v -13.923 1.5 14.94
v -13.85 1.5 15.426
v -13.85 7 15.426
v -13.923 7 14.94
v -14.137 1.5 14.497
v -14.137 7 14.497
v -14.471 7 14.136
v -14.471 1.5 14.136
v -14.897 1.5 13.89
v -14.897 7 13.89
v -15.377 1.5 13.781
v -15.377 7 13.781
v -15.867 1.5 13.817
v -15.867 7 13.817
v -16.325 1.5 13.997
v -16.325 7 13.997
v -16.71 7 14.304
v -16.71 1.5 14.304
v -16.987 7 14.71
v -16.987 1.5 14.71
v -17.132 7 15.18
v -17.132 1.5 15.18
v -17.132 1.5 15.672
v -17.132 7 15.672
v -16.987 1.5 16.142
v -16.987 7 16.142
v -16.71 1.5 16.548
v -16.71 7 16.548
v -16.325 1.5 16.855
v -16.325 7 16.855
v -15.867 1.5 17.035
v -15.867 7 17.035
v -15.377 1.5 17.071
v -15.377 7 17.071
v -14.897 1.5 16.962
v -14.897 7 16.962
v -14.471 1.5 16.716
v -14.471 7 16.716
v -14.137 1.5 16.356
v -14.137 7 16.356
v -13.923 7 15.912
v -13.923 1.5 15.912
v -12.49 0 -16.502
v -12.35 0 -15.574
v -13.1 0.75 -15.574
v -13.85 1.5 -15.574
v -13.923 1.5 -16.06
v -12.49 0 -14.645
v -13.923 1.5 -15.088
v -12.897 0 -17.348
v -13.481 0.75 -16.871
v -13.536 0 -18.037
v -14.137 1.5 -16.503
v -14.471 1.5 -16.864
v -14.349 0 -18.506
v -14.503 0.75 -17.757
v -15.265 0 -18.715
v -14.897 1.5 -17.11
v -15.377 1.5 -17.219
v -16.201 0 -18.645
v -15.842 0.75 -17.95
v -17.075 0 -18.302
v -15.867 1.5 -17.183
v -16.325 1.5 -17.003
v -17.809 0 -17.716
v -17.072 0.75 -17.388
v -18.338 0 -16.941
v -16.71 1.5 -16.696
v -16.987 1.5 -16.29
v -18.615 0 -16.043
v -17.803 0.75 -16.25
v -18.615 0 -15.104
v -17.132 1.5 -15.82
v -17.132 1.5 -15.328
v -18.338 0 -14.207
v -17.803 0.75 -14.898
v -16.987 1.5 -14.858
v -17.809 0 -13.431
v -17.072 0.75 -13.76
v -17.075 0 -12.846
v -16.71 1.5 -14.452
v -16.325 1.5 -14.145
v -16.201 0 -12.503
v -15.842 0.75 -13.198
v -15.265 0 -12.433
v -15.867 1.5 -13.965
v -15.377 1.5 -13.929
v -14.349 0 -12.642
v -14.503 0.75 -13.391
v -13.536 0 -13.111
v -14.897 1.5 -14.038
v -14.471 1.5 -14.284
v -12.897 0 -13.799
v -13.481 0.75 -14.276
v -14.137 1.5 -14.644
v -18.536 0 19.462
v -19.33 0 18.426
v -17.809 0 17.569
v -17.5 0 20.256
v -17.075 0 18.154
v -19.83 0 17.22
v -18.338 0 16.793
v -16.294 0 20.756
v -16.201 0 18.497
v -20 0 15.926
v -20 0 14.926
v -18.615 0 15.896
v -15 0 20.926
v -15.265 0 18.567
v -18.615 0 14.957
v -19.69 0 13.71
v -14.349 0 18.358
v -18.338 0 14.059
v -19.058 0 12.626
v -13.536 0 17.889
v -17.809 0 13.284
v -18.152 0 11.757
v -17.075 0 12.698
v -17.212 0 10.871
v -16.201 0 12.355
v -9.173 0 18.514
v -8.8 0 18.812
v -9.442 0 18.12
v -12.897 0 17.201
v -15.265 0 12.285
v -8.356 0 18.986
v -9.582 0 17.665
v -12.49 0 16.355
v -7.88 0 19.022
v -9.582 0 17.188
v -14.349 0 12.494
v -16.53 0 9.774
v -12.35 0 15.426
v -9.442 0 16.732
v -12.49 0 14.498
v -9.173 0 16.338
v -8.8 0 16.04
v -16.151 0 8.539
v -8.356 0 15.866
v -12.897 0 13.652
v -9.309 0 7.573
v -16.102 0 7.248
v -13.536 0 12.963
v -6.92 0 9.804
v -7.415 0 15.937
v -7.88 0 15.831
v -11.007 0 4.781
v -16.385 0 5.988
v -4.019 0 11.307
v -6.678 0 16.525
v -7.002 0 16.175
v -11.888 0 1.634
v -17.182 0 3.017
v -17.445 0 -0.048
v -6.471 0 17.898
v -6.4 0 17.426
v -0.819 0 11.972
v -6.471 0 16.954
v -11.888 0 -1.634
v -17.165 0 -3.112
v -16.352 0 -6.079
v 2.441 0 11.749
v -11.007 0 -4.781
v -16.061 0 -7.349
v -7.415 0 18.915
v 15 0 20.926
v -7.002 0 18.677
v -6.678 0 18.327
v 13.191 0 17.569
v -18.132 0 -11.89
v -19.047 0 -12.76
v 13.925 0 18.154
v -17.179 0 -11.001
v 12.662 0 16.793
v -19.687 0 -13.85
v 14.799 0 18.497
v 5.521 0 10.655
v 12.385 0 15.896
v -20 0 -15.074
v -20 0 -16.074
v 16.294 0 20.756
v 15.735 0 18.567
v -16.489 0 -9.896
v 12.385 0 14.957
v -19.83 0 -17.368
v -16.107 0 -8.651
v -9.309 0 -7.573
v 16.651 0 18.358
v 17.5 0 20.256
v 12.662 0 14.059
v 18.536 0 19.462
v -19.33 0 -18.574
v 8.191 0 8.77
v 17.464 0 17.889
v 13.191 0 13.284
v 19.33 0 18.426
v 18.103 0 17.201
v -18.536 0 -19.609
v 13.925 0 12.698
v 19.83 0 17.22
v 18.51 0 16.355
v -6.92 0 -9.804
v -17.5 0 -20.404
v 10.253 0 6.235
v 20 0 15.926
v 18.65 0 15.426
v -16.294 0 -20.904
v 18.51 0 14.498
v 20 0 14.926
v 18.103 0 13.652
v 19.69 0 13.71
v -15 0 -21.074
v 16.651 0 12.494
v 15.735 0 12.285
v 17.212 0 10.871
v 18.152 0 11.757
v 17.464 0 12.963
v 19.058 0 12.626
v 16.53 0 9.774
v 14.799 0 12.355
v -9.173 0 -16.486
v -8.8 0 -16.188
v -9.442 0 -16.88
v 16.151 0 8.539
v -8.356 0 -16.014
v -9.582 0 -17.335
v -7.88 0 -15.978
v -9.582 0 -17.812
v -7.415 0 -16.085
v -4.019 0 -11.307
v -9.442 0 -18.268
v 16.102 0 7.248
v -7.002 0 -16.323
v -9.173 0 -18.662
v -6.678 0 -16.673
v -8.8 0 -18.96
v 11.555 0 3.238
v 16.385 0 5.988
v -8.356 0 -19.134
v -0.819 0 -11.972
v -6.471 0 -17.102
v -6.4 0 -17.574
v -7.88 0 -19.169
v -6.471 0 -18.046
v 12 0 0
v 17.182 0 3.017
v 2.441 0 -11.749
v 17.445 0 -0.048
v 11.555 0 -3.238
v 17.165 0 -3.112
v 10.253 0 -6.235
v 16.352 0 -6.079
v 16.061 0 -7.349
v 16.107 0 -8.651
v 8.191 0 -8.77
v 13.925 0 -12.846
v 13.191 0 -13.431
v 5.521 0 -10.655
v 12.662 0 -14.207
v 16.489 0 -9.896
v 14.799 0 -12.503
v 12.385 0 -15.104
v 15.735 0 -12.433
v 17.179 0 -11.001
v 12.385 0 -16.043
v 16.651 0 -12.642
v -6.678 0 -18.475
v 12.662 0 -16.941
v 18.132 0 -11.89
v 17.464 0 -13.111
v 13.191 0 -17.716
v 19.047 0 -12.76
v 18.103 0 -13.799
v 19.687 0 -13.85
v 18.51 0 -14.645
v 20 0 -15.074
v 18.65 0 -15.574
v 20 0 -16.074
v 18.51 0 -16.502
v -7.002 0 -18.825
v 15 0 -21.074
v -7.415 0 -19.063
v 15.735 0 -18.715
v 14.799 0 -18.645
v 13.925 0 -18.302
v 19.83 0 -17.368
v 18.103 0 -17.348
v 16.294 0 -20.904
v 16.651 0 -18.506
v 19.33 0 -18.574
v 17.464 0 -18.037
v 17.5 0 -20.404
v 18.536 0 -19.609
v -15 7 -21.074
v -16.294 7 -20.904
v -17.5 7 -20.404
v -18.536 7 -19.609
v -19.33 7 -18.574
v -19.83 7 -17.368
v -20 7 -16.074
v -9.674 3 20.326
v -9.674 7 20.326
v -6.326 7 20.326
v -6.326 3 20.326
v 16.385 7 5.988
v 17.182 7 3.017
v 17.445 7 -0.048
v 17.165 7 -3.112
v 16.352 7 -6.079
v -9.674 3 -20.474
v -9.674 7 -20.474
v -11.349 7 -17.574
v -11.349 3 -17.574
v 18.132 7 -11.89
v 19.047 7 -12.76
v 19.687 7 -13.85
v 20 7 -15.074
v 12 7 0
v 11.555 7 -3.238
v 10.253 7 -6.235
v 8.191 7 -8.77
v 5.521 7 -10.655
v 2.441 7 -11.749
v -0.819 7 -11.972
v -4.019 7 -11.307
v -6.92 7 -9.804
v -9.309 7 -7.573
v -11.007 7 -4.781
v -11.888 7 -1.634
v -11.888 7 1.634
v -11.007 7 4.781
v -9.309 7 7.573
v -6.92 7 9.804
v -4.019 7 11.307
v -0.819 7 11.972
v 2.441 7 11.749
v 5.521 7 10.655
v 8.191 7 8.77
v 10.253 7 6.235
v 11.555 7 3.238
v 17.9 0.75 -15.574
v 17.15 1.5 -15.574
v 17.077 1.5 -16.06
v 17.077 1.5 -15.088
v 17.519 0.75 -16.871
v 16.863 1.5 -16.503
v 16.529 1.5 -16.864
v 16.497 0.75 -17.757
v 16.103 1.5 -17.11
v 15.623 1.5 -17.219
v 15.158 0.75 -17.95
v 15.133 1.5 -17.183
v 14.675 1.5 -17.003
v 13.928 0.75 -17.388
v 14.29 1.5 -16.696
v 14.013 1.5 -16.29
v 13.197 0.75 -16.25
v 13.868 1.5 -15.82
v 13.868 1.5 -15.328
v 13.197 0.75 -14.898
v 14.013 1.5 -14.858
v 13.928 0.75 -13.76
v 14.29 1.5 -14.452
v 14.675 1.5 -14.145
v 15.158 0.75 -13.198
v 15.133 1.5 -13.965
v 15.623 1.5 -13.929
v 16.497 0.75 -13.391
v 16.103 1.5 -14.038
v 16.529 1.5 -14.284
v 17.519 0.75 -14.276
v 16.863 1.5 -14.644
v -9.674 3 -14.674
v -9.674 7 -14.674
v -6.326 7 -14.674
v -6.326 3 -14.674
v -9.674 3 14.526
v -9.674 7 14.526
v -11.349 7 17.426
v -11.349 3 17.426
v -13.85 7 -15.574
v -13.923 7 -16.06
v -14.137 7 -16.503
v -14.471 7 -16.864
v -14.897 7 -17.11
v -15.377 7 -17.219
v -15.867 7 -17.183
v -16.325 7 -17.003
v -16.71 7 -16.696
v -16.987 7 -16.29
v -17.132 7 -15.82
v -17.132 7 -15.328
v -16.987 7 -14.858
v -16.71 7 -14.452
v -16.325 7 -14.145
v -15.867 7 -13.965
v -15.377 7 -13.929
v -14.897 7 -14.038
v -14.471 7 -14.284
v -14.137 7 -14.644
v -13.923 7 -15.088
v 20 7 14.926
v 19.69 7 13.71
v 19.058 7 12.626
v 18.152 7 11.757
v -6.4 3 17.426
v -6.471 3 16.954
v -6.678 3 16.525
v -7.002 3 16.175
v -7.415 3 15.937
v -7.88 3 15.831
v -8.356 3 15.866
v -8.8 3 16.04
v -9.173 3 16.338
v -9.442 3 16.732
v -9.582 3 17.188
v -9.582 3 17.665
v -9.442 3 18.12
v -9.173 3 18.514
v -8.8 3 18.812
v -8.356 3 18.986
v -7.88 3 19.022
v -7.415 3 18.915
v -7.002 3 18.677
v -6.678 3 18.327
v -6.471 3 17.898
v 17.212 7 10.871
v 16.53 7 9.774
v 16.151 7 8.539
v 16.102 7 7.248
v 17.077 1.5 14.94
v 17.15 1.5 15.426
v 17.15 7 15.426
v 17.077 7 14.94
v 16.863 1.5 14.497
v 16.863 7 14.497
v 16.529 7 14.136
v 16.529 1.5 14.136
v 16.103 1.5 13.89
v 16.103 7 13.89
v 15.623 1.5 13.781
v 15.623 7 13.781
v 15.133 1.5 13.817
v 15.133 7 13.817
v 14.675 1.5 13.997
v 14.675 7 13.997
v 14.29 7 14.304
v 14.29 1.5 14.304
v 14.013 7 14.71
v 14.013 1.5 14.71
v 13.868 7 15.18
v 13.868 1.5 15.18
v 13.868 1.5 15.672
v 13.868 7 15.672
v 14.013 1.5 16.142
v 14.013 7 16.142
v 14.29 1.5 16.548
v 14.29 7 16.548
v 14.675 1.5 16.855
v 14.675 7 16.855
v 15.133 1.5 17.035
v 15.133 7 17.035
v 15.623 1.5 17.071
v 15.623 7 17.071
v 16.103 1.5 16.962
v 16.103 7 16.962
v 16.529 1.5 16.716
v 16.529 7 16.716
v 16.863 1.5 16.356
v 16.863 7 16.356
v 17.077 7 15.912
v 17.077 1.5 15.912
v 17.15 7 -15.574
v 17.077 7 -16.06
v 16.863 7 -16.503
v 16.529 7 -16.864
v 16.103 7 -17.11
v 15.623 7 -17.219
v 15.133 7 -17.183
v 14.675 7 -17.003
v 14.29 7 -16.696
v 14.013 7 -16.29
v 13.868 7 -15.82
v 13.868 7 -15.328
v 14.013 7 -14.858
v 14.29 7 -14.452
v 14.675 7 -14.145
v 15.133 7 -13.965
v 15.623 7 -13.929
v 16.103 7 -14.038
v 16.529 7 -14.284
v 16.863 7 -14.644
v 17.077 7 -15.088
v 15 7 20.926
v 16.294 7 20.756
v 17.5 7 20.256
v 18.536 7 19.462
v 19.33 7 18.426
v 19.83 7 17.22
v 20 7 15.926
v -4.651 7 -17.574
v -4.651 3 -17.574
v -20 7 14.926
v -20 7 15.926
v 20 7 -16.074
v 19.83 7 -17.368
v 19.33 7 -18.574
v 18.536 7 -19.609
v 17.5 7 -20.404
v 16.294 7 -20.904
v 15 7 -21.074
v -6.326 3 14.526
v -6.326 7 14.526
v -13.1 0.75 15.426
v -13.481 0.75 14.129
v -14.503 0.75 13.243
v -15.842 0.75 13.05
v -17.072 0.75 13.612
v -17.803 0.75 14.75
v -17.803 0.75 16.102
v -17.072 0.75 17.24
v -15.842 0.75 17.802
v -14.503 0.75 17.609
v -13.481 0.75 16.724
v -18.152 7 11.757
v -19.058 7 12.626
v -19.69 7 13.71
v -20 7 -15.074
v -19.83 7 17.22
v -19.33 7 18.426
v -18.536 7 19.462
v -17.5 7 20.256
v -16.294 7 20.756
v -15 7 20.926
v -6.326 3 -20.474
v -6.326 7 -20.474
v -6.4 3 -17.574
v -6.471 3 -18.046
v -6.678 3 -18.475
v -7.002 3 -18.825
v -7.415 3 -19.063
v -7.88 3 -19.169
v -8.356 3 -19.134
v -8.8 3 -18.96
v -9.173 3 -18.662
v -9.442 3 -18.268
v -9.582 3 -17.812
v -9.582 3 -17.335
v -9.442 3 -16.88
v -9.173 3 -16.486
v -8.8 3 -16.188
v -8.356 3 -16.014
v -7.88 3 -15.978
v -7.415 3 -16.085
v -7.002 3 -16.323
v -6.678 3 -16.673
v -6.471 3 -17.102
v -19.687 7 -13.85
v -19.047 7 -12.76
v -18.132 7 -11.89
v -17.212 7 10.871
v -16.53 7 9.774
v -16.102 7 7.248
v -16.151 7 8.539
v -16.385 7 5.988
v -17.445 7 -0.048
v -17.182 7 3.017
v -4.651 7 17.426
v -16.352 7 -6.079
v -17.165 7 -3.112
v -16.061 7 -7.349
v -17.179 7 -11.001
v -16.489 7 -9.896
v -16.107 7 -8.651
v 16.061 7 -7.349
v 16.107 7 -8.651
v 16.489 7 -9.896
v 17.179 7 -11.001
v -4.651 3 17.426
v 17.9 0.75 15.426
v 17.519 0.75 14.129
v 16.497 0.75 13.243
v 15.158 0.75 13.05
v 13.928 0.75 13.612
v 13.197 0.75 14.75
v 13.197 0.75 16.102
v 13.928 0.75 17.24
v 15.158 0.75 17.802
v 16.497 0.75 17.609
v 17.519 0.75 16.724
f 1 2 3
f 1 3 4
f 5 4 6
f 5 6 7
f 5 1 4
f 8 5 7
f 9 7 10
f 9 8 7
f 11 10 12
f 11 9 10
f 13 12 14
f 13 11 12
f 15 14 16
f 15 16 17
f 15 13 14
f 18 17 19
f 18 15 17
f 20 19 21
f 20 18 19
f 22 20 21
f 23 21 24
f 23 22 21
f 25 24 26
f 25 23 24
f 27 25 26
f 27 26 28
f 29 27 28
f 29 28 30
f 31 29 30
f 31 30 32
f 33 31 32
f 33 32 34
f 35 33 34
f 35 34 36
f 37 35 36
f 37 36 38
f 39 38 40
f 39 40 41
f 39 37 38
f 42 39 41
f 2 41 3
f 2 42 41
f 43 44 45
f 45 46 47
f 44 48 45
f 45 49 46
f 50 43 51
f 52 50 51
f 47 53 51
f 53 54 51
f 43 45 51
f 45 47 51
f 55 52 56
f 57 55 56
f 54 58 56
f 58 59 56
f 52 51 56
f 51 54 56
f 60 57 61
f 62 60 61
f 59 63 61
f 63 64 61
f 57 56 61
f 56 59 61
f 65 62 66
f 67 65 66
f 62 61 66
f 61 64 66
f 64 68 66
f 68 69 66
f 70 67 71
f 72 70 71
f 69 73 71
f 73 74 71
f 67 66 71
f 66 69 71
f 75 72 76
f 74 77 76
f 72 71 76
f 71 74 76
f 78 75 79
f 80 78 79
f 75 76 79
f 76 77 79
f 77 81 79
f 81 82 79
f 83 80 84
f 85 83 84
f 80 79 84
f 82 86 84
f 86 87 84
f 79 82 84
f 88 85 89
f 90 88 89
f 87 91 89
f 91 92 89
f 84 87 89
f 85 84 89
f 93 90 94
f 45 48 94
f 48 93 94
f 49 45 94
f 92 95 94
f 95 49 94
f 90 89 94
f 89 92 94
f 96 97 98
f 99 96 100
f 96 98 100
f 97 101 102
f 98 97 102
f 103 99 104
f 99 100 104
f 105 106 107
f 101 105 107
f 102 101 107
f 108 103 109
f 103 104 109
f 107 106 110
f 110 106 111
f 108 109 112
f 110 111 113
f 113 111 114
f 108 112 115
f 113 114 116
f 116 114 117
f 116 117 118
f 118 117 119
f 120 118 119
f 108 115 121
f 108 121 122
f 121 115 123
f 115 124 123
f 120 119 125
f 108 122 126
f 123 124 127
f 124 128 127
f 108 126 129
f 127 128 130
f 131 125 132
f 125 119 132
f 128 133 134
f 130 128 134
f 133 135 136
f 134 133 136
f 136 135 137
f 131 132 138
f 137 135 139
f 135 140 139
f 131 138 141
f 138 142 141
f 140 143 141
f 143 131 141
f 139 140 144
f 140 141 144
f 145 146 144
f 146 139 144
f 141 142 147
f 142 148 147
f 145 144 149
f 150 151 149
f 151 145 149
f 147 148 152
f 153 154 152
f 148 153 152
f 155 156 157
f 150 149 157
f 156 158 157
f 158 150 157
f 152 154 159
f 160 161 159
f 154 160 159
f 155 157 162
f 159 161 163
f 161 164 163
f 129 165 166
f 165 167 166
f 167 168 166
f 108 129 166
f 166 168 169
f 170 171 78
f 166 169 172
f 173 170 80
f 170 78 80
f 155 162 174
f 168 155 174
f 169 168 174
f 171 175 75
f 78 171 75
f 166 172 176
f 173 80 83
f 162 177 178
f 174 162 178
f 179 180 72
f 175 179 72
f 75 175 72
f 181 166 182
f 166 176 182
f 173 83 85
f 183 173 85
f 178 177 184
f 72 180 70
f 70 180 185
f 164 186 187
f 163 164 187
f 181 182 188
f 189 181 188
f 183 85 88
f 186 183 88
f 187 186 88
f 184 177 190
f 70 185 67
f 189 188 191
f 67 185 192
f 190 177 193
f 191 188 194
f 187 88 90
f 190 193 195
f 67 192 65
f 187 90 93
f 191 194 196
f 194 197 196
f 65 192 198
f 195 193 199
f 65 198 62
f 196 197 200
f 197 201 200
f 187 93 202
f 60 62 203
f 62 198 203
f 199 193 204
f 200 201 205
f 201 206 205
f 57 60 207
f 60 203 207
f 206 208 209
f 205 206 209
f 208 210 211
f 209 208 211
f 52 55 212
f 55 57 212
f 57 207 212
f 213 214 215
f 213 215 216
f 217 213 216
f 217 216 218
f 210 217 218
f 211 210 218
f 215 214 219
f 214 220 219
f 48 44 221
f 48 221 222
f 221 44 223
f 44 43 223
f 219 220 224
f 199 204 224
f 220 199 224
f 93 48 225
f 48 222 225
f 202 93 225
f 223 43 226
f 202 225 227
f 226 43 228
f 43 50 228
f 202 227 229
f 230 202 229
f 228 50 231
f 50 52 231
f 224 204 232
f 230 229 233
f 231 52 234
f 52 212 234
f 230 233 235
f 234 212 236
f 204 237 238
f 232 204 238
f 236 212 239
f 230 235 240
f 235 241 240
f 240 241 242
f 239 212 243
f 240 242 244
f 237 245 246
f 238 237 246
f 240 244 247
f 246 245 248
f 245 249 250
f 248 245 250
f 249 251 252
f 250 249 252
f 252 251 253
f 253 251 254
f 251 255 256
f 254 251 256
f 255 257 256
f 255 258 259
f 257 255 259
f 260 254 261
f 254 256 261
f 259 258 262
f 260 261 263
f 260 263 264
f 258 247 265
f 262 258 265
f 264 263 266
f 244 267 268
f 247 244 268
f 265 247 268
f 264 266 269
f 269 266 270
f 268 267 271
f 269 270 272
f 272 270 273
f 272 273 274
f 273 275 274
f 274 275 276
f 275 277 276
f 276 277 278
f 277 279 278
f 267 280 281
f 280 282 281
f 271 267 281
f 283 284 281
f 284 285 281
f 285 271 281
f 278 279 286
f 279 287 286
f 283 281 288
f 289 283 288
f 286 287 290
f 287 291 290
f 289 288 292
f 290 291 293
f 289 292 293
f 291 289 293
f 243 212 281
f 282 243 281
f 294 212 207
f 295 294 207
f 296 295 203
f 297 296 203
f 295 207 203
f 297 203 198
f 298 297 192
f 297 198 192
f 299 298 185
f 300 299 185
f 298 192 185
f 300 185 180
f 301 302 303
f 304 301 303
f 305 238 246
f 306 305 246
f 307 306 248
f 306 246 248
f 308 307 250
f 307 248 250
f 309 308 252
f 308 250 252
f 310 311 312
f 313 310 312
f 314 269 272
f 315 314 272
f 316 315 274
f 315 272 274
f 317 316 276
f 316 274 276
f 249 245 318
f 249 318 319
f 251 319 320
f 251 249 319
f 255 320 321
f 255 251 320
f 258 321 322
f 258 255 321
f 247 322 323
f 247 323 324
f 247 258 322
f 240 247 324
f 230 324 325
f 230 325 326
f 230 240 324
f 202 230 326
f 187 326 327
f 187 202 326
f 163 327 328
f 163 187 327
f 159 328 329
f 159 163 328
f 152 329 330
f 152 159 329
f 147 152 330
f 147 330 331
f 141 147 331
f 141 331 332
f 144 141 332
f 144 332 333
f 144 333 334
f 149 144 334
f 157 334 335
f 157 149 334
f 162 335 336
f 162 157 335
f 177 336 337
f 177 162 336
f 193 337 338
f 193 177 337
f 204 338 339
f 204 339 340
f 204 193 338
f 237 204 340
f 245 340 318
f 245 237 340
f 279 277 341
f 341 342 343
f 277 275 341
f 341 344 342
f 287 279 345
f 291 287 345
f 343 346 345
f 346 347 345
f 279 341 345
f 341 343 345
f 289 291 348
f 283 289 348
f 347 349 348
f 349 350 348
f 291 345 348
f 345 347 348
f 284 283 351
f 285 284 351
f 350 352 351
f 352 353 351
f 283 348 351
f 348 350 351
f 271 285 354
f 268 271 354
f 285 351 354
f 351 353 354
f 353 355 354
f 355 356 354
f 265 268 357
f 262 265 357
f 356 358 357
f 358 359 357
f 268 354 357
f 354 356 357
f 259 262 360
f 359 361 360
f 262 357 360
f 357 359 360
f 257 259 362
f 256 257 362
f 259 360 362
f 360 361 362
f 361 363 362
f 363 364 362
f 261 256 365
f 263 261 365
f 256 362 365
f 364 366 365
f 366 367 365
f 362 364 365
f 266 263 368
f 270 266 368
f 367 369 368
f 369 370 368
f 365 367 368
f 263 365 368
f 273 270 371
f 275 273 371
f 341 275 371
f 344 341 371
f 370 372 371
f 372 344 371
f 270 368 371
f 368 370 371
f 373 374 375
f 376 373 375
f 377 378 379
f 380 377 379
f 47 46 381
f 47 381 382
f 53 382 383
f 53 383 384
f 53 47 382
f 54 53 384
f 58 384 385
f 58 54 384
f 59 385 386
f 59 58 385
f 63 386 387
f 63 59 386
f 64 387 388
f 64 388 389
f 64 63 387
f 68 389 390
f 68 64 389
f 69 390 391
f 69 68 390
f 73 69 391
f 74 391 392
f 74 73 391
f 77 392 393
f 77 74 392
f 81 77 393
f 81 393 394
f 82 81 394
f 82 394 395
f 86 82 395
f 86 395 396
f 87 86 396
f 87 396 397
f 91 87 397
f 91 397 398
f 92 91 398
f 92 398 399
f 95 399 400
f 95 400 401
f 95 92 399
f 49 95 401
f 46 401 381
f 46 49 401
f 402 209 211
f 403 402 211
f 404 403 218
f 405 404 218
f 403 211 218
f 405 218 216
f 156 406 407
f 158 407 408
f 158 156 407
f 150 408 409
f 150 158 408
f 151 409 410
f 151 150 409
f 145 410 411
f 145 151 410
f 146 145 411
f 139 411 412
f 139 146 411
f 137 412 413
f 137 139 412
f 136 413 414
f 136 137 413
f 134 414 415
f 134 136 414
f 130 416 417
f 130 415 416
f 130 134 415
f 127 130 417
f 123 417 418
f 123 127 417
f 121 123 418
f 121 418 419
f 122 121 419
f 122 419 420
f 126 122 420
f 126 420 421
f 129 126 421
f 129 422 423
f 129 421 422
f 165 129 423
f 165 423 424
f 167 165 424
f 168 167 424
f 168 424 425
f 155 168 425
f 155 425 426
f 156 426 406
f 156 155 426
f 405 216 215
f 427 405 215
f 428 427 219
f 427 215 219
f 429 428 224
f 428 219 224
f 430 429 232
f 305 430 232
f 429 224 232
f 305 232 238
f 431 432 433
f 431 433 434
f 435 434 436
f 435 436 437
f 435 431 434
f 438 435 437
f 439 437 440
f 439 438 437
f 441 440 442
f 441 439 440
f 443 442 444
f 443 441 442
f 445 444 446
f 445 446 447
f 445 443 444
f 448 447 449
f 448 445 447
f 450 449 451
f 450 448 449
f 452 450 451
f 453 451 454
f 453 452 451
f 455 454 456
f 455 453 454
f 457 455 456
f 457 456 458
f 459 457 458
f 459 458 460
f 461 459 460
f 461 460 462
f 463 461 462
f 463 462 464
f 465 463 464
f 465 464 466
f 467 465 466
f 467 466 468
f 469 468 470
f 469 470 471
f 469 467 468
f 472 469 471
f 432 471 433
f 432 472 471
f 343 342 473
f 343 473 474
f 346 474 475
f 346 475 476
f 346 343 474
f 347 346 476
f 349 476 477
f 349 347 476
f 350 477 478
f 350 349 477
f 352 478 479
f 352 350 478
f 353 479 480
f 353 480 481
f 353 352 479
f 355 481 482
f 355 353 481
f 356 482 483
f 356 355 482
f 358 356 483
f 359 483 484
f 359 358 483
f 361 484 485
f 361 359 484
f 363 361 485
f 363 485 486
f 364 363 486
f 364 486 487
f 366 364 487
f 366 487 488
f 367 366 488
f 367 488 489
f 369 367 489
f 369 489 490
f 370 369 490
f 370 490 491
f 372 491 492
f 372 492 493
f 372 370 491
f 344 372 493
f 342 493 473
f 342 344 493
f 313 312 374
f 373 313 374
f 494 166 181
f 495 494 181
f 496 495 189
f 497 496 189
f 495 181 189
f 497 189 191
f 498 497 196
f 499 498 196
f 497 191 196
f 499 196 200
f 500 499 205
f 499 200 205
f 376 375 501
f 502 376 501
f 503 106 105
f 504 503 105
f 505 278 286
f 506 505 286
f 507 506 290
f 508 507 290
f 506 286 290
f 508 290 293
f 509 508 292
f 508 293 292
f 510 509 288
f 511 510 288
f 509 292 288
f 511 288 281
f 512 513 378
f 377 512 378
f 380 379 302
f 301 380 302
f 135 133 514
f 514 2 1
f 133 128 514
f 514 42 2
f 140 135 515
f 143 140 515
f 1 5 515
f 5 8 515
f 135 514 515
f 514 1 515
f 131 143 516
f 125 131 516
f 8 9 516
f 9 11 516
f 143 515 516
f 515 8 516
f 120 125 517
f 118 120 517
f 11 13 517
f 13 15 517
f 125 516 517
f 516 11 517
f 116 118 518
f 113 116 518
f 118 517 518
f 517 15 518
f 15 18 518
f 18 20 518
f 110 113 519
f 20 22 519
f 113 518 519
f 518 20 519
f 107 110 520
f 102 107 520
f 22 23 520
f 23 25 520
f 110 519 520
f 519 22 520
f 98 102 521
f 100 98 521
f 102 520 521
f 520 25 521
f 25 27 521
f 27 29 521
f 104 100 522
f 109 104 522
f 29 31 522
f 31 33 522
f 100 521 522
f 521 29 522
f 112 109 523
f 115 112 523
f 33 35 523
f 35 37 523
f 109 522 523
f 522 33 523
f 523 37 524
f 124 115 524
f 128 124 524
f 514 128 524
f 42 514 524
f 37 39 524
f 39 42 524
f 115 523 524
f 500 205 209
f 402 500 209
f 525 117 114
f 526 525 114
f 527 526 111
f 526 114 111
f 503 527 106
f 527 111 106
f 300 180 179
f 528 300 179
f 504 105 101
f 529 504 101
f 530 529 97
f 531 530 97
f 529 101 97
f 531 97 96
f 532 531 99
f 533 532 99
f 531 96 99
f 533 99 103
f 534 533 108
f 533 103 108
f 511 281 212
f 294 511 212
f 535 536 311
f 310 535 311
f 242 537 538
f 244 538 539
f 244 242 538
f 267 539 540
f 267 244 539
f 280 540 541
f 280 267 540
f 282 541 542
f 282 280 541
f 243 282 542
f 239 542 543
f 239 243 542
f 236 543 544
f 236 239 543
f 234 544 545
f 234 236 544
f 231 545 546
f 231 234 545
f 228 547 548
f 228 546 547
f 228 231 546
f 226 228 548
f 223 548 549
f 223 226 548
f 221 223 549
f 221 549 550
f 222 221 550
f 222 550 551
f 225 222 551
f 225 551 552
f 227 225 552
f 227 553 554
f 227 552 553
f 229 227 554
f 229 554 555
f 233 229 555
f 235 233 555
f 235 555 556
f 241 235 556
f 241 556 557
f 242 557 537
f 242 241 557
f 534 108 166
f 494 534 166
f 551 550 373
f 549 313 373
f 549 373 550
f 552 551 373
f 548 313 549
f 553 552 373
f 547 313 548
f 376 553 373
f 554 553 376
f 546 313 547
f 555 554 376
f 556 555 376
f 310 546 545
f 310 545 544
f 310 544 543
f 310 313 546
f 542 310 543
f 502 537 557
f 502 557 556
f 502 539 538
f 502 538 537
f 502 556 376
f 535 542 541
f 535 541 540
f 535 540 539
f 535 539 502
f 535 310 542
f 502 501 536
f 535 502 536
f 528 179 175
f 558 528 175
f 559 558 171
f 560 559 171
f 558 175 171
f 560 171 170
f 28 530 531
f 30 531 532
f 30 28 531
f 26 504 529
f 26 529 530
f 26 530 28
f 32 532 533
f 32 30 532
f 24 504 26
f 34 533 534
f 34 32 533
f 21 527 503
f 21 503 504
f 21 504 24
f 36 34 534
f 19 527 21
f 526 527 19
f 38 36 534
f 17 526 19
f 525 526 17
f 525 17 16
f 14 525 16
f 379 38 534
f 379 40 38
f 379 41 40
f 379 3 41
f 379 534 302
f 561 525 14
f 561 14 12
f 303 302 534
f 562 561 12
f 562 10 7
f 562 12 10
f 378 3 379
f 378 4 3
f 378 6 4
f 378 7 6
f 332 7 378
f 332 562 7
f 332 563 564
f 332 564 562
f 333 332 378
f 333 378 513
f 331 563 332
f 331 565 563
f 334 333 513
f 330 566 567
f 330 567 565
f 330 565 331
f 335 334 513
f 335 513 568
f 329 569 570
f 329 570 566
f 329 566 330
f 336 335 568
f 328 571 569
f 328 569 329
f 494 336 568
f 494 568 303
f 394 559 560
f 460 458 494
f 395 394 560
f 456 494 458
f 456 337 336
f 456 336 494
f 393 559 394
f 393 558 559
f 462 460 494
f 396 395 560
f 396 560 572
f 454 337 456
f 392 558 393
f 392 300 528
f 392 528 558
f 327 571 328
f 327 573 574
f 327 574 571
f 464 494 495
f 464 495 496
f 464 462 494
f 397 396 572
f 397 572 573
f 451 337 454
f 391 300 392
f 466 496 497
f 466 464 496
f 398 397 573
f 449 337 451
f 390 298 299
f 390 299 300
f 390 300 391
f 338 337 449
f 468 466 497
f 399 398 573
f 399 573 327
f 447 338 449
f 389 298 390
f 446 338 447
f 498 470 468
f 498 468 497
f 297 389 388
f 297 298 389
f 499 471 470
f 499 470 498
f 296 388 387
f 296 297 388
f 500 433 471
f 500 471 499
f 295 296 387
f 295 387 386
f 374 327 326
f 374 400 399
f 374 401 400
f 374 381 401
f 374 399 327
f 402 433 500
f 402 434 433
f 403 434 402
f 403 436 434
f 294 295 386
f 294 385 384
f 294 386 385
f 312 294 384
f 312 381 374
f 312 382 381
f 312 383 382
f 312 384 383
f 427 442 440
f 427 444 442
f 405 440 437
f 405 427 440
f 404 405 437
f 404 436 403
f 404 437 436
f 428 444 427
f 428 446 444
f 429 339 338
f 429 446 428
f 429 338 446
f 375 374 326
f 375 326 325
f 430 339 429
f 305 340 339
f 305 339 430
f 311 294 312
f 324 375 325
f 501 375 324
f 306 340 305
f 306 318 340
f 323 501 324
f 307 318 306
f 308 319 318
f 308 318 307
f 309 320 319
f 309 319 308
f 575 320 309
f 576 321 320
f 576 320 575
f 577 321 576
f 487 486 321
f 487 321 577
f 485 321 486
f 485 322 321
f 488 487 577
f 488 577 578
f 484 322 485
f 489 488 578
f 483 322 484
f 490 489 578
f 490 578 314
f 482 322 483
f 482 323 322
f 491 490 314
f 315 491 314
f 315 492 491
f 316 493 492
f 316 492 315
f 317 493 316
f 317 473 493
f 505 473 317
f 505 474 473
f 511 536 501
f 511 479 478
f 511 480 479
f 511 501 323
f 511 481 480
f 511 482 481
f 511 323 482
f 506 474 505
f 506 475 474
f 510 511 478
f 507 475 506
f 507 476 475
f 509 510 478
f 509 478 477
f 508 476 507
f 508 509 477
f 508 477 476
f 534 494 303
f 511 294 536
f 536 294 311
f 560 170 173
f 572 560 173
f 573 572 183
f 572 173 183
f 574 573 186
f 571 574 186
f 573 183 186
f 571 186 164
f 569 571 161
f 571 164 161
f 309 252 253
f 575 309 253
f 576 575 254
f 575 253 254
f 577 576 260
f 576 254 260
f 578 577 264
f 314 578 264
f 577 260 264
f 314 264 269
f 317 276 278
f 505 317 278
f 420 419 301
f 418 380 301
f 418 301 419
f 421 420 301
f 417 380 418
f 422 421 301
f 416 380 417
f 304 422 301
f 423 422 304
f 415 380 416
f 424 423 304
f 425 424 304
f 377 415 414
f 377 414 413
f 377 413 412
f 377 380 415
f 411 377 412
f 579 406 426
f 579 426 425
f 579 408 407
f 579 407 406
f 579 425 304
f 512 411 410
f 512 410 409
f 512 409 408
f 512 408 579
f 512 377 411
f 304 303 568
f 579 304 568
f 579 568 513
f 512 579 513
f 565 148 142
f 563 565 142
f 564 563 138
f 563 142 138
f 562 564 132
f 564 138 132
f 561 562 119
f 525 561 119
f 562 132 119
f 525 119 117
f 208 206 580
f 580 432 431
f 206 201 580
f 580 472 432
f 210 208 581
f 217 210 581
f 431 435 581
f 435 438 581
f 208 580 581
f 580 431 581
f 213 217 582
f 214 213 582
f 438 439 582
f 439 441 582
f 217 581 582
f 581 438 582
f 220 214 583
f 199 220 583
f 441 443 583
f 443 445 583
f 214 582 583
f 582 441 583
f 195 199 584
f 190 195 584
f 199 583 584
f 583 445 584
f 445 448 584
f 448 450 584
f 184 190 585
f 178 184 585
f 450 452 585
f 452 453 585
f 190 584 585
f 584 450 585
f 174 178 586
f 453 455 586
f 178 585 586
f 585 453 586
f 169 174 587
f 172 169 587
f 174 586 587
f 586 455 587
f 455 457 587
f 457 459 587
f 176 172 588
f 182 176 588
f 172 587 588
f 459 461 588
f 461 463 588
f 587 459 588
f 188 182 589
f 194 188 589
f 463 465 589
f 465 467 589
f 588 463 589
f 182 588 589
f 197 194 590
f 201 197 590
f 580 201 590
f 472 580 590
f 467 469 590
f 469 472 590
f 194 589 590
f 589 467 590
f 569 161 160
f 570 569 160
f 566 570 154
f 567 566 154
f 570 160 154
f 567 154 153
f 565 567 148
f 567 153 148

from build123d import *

# Parameters (mm, degrees)
SKETCH_1_R          = 1.65
SKETCH_1_R_2        = 1.6
SKETCH_1_R_3        = 12
EXTRUDE_2_DEPTH     = 7
CUT_EXTRUDE_1_DEPTH = 4
CHAMFER_1_SIZE      = 1.5


with BuildPart() as part:
    # Эскиз1 → Бобышка-Вытянуть2 (new body)
    with BuildSketch(Plane(origin=(0, 0, 0), x_dir=(1, 0, 0), z_dir=(0, 1, 0))):
        with BuildLine():
            ThreePointArc((-18.152308777, -11.756549774), (-19.411562194, -13.145772627), (-20, -14.926053575))
            Line((-20, -14.926053575), (-20, -15.926053575))
            ThreePointArc((-20, -15.926053575), (-18.535533906, -19.461587481), (-15, -20.926053575))
            Line((-15, -20.926053575), (15, -20.926053575))
            ThreePointArc((15, -20.926053575), (18.535533906, -19.461587481), (20, -15.926053575))
            Line((20, -15.926053575), (20, -14.926053575))
            ThreePointArc((20, -14.926053575), (19.411562194, -13.145772627), (18.152308777, -11.756549774))
            ThreePointArc((18.152308777, -11.756549774), (16.300607831, -9.168856683), (16.385075524, -5.988005046))
            ThreePointArc((16.385075524, -5.988005046), (17.444900664, 0.048427023), (16.351577861, 6.078881955))
            ThreePointArc((16.351577861, 6.078881955), (16.257522585, 9.285823976), (18.131827713, 11.889725627))
            ThreePointArc((18.131827713, 11.889725627), (19.405196174, 13.282780162), (20, 15.073946425))
            Line((20, 15.073946425), (20, 16.073946425))
            ThreePointArc((20, 16.073946425), (18.535533906, 19.609480331), (15, 21.073946425))
            Line((15, 21.073946425), (-15, 21.073946425))
            ThreePointArc((-15, 21.073946425), (-18.535533906, 19.609480331), (-20, 16.073946425))
            Line((-20, 16.073946425), (-20, 15.073946425))
            ThreePointArc((-20, 15.073946425), (-19.405196174, 13.282780162), (-18.131827713, 11.889725627))
            ThreePointArc((-18.131827713, 11.889725627), (-16.257522585, 9.285823976), (-16.351577861, 6.078881955))
            ThreePointArc((-16.351577861, 6.078881955), (-17.444900664, 0.048427023), (-16.385075524, -5.988005046))
            ThreePointArc((-16.385075524, -5.988005046), (-16.300607831, -9.168856683), (-18.152308777, -11.756549774))
        make_face()
        with Locations((-15.5, -15.426053575)):
            Circle(SKETCH_1_R, mode=Mode.SUBTRACT)
        with Locations((-8, -17.426053575)):
            Circle(SKETCH_1_R_2, mode=Mode.SUBTRACT)
        with Locations((15.5, -15.426053575)):
            Circle(SKETCH_1_R, mode=Mode.SUBTRACT)
        Circle(SKETCH_1_R_3, mode=Mode.SUBTRACT)
        with Locations((-15.5, 15.573946425)):
            Circle(SKETCH_1_R, mode=Mode.SUBTRACT)
        with Locations((-8, 17.573946425)):
            Circle(SKETCH_1_R_2, mode=Mode.SUBTRACT)
        with Locations((15.5, 15.573946425)):
            Circle(SKETCH_1_R, mode=Mode.SUBTRACT)
    extrude(amount=EXTRUDE_2_DEPTH)

    # Эскиз2 → Вырез-Вытянуть1 (cut)
    with BuildSketch(Plane(origin=(0, 7, 0), x_dir=(1, 0, 0), z_dir=(0, 1, 0))):
        Polygon((-11.348631561, 17.573946425), (-9.674315781, 14.673946425), (-6.325684219, 14.673946425), (-4.651368439, 17.573946425), (-6.325684219, 20.473946425), (-9.674315781, 20.473946425), align=None)
        Polygon((-4.651368439, -17.426053575), (-6.325684219, -14.526053575), (-9.674315781, -14.526053575), (-11.348631561, -17.426053575), (-9.674315781, -20.326053575), (-6.325684219, -20.326053575), align=None)
    extrude(amount=-CUT_EXTRUDE_1_DEPTH, mode=Mode.SUBTRACT)

    # Фаска1
    chamfer_1_edges = [part.edges().sort_by_distance(p)[0] for p in [
        (-17.15, 0, 15.426053575),
        (13.85, 0, 15.426053575),
        (13.85, 0, -15.573946425),
        (-17.15, 0, -15.573946425),
    ]]
    chamfer(chamfer_1_edges, length=CHAMFER_1_SIZE)


solid = part.part
